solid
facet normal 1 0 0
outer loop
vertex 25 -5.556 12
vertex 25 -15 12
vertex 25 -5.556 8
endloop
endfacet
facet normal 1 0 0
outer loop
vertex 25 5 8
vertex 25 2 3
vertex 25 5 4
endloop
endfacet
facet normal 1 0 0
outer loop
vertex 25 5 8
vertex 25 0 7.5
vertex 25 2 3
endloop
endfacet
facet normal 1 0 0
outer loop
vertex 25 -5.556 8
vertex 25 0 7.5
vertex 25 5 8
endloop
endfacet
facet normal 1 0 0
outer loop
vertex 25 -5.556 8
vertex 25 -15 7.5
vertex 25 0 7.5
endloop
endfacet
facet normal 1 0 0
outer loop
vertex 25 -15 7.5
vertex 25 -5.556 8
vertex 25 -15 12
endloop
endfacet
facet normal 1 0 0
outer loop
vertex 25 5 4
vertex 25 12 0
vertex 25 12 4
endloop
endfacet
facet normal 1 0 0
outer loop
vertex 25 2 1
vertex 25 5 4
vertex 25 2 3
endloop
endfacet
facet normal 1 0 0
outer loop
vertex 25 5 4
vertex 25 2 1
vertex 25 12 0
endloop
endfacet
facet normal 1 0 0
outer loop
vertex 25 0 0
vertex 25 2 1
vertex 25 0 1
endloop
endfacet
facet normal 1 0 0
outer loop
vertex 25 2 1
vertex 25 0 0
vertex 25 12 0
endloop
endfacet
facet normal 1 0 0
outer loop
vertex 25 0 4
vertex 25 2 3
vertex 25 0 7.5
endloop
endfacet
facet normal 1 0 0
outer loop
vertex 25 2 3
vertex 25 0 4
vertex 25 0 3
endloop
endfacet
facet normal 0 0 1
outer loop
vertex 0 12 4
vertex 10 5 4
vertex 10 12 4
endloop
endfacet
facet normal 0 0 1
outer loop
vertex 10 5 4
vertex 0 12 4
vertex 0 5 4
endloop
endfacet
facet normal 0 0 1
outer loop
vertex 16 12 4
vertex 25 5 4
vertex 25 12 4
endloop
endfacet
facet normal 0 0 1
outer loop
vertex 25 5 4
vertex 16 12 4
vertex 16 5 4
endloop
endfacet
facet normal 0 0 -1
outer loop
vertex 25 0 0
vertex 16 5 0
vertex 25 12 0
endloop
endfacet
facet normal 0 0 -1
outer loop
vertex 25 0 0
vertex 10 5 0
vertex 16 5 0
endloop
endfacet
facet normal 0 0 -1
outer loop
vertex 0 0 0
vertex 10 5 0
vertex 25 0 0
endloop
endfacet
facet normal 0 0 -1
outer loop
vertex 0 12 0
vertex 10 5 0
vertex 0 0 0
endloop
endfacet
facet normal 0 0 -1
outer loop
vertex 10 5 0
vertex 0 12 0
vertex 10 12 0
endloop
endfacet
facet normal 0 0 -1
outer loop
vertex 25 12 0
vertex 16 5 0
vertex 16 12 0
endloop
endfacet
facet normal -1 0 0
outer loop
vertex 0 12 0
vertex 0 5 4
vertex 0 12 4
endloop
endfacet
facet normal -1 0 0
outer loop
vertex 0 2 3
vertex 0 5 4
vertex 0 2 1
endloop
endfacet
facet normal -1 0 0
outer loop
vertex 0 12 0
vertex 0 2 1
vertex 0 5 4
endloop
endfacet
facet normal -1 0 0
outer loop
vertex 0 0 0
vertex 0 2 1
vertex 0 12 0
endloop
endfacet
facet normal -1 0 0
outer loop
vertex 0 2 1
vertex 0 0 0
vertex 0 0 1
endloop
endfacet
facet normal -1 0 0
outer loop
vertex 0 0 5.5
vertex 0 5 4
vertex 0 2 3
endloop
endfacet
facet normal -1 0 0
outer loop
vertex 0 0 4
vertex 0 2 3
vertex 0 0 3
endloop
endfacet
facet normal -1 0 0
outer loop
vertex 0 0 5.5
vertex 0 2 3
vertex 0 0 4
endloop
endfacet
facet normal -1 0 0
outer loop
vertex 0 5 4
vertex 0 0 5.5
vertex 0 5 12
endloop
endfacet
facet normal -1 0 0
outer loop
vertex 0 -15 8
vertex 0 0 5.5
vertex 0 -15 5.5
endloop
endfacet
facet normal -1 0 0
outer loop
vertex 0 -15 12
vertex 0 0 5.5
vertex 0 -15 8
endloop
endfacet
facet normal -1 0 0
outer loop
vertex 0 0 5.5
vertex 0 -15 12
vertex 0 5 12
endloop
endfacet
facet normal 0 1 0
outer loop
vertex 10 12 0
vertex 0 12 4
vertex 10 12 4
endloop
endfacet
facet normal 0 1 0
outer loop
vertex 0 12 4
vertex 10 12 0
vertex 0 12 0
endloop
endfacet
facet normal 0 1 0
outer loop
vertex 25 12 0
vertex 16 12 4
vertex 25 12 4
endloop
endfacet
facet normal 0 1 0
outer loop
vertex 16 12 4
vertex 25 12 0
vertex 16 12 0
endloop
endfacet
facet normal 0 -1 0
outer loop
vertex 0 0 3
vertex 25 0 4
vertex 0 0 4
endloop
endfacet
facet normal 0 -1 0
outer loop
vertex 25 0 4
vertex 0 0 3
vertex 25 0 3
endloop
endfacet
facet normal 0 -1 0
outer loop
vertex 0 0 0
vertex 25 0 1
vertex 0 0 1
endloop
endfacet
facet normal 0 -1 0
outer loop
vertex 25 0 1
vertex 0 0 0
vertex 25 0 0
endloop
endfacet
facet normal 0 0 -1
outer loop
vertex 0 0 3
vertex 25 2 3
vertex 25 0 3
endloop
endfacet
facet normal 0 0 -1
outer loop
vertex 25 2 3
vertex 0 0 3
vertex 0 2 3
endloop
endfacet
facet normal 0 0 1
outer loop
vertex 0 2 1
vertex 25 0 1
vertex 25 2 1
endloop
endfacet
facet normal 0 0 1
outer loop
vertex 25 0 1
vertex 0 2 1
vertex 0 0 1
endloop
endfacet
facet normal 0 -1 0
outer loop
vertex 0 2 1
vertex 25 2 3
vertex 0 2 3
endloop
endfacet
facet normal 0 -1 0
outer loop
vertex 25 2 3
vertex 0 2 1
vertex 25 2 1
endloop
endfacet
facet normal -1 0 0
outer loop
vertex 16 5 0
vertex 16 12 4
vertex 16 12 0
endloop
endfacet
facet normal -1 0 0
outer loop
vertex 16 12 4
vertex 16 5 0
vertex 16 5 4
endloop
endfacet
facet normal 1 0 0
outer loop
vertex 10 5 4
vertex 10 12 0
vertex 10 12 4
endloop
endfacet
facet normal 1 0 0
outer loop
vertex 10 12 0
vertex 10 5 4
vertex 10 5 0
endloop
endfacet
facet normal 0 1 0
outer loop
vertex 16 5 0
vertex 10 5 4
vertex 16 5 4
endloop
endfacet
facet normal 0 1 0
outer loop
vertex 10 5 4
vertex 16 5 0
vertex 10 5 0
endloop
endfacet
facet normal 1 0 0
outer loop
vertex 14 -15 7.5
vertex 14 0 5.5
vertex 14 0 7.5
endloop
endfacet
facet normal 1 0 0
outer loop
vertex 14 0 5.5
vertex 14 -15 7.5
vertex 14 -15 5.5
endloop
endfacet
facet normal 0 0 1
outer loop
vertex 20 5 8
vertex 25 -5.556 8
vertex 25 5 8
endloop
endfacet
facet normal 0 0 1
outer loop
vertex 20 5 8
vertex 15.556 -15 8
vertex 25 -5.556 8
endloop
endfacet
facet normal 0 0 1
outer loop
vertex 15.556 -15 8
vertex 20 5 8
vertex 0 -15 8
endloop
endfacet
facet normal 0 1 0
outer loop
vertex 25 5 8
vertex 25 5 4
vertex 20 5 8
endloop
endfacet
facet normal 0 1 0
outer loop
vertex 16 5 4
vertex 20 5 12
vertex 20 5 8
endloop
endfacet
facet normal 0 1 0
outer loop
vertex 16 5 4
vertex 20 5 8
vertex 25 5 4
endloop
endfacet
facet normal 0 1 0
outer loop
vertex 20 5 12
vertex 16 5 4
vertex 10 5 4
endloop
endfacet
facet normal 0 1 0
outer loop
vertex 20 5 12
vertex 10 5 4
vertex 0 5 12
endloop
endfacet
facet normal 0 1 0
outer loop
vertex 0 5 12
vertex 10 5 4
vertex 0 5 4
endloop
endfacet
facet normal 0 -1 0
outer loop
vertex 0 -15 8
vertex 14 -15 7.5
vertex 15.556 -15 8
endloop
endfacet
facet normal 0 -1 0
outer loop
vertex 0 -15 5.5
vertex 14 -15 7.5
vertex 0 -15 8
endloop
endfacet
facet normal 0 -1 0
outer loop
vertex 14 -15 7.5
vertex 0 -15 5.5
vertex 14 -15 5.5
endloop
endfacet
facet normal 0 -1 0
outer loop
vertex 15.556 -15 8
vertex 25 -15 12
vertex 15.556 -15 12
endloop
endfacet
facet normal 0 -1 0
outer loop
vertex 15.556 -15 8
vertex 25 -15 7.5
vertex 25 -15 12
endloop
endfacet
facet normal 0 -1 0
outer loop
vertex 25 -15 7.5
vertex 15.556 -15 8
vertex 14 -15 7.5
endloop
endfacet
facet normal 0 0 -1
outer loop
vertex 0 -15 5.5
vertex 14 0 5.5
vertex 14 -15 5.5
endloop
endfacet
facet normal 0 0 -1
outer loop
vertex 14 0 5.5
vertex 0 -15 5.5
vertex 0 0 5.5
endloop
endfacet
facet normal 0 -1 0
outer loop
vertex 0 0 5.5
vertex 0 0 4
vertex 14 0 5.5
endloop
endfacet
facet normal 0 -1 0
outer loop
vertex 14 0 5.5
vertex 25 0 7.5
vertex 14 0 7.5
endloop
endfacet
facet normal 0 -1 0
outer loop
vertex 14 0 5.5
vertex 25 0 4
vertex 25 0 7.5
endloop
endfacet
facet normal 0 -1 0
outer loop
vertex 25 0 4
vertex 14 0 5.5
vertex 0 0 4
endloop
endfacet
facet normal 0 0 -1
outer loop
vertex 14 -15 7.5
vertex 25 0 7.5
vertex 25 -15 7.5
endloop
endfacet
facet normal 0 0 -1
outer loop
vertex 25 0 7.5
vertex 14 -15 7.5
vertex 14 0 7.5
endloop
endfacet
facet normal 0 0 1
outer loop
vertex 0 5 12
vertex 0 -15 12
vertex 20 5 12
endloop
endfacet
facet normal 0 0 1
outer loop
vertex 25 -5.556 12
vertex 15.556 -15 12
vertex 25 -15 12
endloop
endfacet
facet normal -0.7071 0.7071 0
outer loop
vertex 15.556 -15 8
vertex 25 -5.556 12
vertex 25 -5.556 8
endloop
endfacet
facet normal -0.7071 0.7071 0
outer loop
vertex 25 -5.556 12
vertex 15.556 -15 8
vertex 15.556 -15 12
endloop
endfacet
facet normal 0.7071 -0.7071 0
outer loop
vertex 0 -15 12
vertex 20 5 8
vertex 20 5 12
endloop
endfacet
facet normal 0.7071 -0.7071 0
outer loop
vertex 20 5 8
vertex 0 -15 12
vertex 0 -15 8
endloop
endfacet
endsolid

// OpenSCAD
//case for mindfulness buzzer/feather
//contains disc buzzer, feather, battery, & button
//clip on back? unknown.

//TODO
//make battery tray module, with clip for around top edge of PCB, pass tolerance allotment (0 for printing, >0.1 etc for voiding use)
//make seperate 'board etc void' module. use in difference statement. use battery clip module here as well to include in void
//figure out how to hold case together - end wall by button that slides up on Z axis into slots/receiver?
    //pcb slides in from that side, rails on each side, top side only until JST connection, full length/Y on bottom
    //battery tray can serve as top side rail
//way to hit reset button. paperclip? ugh. captive button/cylinder with fingernail slot on outside of case? maybe.
    //make finger module from rotate extrude for finger pad and linear extrude for nail, then convoluted thing for curved front of nail. 2mm depression depth


draftingFNs = 36;
renderFNs = 180;
$fn = draftingFNs;

printTolerance = 0.2;


caseX = 55;
caseY = 30;
caseZ = 15; 
caseMinkRad = 3;
//mink cube as base

module case(){
minkowski(){
    cube([caseX,caseY,caseZ]);
    sphere(caseMinkRad);
}
}


trayHeight = 4; //TODO do we want to make edge that goes into slot thinner?
trayY = 12;
trayX = 25;
trayBoardInsetY = 2;
trayBoardInsetZ = 2;
trayBoardInsetZOffset = 1;


trayBatterySupportFwdZOffset = 1.5;
trayBatterySupportRearZOffset = 3.5;
trayBatterySupportFwdX = 14;
trayBatterySupportRearX = trayX - trayBatterySupportFwdX;
trayBatterySupportZHeight = 4;
trayBatterySupportY = 20;
trayBatterySupportYOverlap = 5; //or set as (trayY-trayBoardInsetY)/2 ?
trayBatteryHolderZ = 4;
//X & Y & Z are somehwat arbitraty here, so called X the small side, Y the long side, Z the smallest/shortest side
trayBatteryHolderX = 11;
trayBatteryHolderY = 35; //with cables


trayBoardCableSlotX = 6;
trayBoardCableSlotXOffset = 10;
trayBoardCableSlotY = trayY - trayBatterySupportYOverlap;
trayBoardCableSlotYOffset = trayBatterySupportYOverlap;


//use 0 tolerance to create actual piece, use non-zero tolerance when using this module to difference from the receiving piece
module tray(trayTolerance){ 
    //printer tolerance only needed for top edge of battery holder, top & bottom edge of slot, y edge of part that goes into case receiving slot
    //also move slot for board up by 1 trayTolerance amount, so board is centered vertically between the Z tolerances
    difference(){
        //the part of the tray that goes around edge of board and into slot in case
        cube([trayX,trayY + trayTolerance,trayHeight + trayTolerance*2]);
        
        //remove void for edge of board
        translate([0,0,trayBoardInsetZOffset + trayTolerance]){
            cube([trayX,trayBoardInsetY,trayBoardInsetZ + trayTolerance]); //TODO check this, only doing one so tighter fit for board
        }  
        
        //remove slot for battery cables
        translate([trayBoardCableSlotXOffset,trayBoardCableSlotYOffset,0]){
            cube([trayBoardCableSlotX,trayBoardCableSlotY,trayHeight + trayTolerance*2]);
        }  
    }
    
    //battery Support forward part of tray (closer to USB port)
    translate([0,-(trayBatterySupportY-trayBatterySupportYOverlap),trayHeight]){
        difference(){
        //main part
            cube([trayBatterySupportFwdX,trayBatterySupportY,trayBatterySupportZHeight]);

        //subtract from under it to slide over components
            cube([trayBatterySupportFwdX,trayBatterySupportY-trayBatterySupportYOverlap,trayBatterySupportFwdZOffset]);
        }  
    }
    
    //battery Support rear part of tray (further from USB port)
    translate([trayBatterySupportFwdX,-(trayBatterySupportY-trayBatterySupportYOverlap),trayHeight]){
        difference(){
        //main part
            cube([trayBatterySupportRearX,trayBatterySupportY,trayBatterySupportZHeight]);

        //subtract from under it to slide over components
            cube([trayBatterySupportRearX,trayBatterySupportY-trayBatterySupportYOverlap,trayBatterySupportRearZOffset]);
        }  
    }
    
    //holder for battery that sits on top of battery support XY plane
    translate([0,-(trayBatterySupportY-trayBatterySupportYOverlap),trayHeight+trayBatterySupportZHeight]){
        difference(){
            cube([trayX,trayBatterySupportY,trayBatteryHolderZ]);
            translate([0,0,0]){
                rotate([0,0,-45]){ //TODO hmm -45 is prob just about right. for exactness, battery void should be moved down a bit Y (bc battery hangs over this tray) and back some X, but I think that would get us to roughly the same spot actually
                    cube([trayBatteryHolderX,trayBatteryHolderY,trayBatteryHolderZ]);
                }
            }
        }
    }
    
    
    
}

tray(0.0);
